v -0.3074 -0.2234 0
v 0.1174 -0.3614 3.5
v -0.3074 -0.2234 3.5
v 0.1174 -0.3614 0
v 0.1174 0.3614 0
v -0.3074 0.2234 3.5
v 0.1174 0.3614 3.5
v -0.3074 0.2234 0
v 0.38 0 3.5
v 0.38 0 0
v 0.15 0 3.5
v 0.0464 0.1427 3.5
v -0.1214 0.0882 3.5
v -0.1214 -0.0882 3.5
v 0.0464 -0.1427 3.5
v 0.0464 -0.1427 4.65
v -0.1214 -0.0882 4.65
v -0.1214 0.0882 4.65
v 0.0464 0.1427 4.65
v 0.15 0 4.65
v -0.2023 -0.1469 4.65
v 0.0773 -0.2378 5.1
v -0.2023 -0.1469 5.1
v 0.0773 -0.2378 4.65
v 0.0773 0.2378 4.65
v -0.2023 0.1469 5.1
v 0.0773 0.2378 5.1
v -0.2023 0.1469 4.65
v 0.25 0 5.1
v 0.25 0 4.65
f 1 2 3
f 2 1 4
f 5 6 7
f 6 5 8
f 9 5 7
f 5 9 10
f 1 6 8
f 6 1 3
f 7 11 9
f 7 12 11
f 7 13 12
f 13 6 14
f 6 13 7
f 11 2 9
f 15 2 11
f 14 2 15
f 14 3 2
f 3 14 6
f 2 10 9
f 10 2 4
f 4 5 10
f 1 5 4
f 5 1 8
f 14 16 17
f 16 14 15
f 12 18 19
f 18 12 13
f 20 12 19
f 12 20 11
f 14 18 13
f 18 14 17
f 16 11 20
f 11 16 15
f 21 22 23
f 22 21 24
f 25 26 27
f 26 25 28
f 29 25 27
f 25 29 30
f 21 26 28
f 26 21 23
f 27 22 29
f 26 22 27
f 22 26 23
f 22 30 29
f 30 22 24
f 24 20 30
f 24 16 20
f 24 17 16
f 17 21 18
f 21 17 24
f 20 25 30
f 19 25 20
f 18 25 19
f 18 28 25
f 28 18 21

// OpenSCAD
// Parameters
body_diameter_mm = 0.76; //[0.38:1.52:0.01]
overall_height_mm = 4.7; //[2.35:9.4:0.05]
body_height_mm = 3.5; //[1.75:7:0.05]
lever_height_mm = 1.2; //[0.6:2.4:0.05]
lever_diameter_mm = 0.3; //[0.15:0.6:0.01]
toggle_diameter_mm = 0.5; //[0.25:1:0.01]
toggle_height_mm = 0.4; //[0.2:0.8:0.01]
overlap_mm = 0.05; //[0.02:0.2:0.01]

// Toggle switch model
module toggle_switch_model() {
  union() {
    // Cylindrical body
    color("DimGray") {
      translate([0, 0, body_height_mm / 2])
        cylinder(r=body_diameter_mm / 2, h=body_height_mm, center=true);
    }
    
    // Actuator lever
    color("Silver") {
      translate([0, 0, body_height_mm + (lever_height_mm + overlap_mm) / 2 - overlap_mm])
        cylinder(r=lever_diameter_mm / 2, h=lever_height_mm + overlap_mm, center=true);
    }
    
    // Toggle cap
    color("Black") {
      translate([0, 0, body_height_mm + lever_height_mm + (toggle_height_mm + overlap_mm) / 2 - overlap_mm])
        cylinder(r=toggle_diameter_mm / 2, h=toggle_height_mm + overlap_mm, center=true);
    }
  }
}

// Assembly
module assembly() {
  toggle_switch_model();
}

assembly();
